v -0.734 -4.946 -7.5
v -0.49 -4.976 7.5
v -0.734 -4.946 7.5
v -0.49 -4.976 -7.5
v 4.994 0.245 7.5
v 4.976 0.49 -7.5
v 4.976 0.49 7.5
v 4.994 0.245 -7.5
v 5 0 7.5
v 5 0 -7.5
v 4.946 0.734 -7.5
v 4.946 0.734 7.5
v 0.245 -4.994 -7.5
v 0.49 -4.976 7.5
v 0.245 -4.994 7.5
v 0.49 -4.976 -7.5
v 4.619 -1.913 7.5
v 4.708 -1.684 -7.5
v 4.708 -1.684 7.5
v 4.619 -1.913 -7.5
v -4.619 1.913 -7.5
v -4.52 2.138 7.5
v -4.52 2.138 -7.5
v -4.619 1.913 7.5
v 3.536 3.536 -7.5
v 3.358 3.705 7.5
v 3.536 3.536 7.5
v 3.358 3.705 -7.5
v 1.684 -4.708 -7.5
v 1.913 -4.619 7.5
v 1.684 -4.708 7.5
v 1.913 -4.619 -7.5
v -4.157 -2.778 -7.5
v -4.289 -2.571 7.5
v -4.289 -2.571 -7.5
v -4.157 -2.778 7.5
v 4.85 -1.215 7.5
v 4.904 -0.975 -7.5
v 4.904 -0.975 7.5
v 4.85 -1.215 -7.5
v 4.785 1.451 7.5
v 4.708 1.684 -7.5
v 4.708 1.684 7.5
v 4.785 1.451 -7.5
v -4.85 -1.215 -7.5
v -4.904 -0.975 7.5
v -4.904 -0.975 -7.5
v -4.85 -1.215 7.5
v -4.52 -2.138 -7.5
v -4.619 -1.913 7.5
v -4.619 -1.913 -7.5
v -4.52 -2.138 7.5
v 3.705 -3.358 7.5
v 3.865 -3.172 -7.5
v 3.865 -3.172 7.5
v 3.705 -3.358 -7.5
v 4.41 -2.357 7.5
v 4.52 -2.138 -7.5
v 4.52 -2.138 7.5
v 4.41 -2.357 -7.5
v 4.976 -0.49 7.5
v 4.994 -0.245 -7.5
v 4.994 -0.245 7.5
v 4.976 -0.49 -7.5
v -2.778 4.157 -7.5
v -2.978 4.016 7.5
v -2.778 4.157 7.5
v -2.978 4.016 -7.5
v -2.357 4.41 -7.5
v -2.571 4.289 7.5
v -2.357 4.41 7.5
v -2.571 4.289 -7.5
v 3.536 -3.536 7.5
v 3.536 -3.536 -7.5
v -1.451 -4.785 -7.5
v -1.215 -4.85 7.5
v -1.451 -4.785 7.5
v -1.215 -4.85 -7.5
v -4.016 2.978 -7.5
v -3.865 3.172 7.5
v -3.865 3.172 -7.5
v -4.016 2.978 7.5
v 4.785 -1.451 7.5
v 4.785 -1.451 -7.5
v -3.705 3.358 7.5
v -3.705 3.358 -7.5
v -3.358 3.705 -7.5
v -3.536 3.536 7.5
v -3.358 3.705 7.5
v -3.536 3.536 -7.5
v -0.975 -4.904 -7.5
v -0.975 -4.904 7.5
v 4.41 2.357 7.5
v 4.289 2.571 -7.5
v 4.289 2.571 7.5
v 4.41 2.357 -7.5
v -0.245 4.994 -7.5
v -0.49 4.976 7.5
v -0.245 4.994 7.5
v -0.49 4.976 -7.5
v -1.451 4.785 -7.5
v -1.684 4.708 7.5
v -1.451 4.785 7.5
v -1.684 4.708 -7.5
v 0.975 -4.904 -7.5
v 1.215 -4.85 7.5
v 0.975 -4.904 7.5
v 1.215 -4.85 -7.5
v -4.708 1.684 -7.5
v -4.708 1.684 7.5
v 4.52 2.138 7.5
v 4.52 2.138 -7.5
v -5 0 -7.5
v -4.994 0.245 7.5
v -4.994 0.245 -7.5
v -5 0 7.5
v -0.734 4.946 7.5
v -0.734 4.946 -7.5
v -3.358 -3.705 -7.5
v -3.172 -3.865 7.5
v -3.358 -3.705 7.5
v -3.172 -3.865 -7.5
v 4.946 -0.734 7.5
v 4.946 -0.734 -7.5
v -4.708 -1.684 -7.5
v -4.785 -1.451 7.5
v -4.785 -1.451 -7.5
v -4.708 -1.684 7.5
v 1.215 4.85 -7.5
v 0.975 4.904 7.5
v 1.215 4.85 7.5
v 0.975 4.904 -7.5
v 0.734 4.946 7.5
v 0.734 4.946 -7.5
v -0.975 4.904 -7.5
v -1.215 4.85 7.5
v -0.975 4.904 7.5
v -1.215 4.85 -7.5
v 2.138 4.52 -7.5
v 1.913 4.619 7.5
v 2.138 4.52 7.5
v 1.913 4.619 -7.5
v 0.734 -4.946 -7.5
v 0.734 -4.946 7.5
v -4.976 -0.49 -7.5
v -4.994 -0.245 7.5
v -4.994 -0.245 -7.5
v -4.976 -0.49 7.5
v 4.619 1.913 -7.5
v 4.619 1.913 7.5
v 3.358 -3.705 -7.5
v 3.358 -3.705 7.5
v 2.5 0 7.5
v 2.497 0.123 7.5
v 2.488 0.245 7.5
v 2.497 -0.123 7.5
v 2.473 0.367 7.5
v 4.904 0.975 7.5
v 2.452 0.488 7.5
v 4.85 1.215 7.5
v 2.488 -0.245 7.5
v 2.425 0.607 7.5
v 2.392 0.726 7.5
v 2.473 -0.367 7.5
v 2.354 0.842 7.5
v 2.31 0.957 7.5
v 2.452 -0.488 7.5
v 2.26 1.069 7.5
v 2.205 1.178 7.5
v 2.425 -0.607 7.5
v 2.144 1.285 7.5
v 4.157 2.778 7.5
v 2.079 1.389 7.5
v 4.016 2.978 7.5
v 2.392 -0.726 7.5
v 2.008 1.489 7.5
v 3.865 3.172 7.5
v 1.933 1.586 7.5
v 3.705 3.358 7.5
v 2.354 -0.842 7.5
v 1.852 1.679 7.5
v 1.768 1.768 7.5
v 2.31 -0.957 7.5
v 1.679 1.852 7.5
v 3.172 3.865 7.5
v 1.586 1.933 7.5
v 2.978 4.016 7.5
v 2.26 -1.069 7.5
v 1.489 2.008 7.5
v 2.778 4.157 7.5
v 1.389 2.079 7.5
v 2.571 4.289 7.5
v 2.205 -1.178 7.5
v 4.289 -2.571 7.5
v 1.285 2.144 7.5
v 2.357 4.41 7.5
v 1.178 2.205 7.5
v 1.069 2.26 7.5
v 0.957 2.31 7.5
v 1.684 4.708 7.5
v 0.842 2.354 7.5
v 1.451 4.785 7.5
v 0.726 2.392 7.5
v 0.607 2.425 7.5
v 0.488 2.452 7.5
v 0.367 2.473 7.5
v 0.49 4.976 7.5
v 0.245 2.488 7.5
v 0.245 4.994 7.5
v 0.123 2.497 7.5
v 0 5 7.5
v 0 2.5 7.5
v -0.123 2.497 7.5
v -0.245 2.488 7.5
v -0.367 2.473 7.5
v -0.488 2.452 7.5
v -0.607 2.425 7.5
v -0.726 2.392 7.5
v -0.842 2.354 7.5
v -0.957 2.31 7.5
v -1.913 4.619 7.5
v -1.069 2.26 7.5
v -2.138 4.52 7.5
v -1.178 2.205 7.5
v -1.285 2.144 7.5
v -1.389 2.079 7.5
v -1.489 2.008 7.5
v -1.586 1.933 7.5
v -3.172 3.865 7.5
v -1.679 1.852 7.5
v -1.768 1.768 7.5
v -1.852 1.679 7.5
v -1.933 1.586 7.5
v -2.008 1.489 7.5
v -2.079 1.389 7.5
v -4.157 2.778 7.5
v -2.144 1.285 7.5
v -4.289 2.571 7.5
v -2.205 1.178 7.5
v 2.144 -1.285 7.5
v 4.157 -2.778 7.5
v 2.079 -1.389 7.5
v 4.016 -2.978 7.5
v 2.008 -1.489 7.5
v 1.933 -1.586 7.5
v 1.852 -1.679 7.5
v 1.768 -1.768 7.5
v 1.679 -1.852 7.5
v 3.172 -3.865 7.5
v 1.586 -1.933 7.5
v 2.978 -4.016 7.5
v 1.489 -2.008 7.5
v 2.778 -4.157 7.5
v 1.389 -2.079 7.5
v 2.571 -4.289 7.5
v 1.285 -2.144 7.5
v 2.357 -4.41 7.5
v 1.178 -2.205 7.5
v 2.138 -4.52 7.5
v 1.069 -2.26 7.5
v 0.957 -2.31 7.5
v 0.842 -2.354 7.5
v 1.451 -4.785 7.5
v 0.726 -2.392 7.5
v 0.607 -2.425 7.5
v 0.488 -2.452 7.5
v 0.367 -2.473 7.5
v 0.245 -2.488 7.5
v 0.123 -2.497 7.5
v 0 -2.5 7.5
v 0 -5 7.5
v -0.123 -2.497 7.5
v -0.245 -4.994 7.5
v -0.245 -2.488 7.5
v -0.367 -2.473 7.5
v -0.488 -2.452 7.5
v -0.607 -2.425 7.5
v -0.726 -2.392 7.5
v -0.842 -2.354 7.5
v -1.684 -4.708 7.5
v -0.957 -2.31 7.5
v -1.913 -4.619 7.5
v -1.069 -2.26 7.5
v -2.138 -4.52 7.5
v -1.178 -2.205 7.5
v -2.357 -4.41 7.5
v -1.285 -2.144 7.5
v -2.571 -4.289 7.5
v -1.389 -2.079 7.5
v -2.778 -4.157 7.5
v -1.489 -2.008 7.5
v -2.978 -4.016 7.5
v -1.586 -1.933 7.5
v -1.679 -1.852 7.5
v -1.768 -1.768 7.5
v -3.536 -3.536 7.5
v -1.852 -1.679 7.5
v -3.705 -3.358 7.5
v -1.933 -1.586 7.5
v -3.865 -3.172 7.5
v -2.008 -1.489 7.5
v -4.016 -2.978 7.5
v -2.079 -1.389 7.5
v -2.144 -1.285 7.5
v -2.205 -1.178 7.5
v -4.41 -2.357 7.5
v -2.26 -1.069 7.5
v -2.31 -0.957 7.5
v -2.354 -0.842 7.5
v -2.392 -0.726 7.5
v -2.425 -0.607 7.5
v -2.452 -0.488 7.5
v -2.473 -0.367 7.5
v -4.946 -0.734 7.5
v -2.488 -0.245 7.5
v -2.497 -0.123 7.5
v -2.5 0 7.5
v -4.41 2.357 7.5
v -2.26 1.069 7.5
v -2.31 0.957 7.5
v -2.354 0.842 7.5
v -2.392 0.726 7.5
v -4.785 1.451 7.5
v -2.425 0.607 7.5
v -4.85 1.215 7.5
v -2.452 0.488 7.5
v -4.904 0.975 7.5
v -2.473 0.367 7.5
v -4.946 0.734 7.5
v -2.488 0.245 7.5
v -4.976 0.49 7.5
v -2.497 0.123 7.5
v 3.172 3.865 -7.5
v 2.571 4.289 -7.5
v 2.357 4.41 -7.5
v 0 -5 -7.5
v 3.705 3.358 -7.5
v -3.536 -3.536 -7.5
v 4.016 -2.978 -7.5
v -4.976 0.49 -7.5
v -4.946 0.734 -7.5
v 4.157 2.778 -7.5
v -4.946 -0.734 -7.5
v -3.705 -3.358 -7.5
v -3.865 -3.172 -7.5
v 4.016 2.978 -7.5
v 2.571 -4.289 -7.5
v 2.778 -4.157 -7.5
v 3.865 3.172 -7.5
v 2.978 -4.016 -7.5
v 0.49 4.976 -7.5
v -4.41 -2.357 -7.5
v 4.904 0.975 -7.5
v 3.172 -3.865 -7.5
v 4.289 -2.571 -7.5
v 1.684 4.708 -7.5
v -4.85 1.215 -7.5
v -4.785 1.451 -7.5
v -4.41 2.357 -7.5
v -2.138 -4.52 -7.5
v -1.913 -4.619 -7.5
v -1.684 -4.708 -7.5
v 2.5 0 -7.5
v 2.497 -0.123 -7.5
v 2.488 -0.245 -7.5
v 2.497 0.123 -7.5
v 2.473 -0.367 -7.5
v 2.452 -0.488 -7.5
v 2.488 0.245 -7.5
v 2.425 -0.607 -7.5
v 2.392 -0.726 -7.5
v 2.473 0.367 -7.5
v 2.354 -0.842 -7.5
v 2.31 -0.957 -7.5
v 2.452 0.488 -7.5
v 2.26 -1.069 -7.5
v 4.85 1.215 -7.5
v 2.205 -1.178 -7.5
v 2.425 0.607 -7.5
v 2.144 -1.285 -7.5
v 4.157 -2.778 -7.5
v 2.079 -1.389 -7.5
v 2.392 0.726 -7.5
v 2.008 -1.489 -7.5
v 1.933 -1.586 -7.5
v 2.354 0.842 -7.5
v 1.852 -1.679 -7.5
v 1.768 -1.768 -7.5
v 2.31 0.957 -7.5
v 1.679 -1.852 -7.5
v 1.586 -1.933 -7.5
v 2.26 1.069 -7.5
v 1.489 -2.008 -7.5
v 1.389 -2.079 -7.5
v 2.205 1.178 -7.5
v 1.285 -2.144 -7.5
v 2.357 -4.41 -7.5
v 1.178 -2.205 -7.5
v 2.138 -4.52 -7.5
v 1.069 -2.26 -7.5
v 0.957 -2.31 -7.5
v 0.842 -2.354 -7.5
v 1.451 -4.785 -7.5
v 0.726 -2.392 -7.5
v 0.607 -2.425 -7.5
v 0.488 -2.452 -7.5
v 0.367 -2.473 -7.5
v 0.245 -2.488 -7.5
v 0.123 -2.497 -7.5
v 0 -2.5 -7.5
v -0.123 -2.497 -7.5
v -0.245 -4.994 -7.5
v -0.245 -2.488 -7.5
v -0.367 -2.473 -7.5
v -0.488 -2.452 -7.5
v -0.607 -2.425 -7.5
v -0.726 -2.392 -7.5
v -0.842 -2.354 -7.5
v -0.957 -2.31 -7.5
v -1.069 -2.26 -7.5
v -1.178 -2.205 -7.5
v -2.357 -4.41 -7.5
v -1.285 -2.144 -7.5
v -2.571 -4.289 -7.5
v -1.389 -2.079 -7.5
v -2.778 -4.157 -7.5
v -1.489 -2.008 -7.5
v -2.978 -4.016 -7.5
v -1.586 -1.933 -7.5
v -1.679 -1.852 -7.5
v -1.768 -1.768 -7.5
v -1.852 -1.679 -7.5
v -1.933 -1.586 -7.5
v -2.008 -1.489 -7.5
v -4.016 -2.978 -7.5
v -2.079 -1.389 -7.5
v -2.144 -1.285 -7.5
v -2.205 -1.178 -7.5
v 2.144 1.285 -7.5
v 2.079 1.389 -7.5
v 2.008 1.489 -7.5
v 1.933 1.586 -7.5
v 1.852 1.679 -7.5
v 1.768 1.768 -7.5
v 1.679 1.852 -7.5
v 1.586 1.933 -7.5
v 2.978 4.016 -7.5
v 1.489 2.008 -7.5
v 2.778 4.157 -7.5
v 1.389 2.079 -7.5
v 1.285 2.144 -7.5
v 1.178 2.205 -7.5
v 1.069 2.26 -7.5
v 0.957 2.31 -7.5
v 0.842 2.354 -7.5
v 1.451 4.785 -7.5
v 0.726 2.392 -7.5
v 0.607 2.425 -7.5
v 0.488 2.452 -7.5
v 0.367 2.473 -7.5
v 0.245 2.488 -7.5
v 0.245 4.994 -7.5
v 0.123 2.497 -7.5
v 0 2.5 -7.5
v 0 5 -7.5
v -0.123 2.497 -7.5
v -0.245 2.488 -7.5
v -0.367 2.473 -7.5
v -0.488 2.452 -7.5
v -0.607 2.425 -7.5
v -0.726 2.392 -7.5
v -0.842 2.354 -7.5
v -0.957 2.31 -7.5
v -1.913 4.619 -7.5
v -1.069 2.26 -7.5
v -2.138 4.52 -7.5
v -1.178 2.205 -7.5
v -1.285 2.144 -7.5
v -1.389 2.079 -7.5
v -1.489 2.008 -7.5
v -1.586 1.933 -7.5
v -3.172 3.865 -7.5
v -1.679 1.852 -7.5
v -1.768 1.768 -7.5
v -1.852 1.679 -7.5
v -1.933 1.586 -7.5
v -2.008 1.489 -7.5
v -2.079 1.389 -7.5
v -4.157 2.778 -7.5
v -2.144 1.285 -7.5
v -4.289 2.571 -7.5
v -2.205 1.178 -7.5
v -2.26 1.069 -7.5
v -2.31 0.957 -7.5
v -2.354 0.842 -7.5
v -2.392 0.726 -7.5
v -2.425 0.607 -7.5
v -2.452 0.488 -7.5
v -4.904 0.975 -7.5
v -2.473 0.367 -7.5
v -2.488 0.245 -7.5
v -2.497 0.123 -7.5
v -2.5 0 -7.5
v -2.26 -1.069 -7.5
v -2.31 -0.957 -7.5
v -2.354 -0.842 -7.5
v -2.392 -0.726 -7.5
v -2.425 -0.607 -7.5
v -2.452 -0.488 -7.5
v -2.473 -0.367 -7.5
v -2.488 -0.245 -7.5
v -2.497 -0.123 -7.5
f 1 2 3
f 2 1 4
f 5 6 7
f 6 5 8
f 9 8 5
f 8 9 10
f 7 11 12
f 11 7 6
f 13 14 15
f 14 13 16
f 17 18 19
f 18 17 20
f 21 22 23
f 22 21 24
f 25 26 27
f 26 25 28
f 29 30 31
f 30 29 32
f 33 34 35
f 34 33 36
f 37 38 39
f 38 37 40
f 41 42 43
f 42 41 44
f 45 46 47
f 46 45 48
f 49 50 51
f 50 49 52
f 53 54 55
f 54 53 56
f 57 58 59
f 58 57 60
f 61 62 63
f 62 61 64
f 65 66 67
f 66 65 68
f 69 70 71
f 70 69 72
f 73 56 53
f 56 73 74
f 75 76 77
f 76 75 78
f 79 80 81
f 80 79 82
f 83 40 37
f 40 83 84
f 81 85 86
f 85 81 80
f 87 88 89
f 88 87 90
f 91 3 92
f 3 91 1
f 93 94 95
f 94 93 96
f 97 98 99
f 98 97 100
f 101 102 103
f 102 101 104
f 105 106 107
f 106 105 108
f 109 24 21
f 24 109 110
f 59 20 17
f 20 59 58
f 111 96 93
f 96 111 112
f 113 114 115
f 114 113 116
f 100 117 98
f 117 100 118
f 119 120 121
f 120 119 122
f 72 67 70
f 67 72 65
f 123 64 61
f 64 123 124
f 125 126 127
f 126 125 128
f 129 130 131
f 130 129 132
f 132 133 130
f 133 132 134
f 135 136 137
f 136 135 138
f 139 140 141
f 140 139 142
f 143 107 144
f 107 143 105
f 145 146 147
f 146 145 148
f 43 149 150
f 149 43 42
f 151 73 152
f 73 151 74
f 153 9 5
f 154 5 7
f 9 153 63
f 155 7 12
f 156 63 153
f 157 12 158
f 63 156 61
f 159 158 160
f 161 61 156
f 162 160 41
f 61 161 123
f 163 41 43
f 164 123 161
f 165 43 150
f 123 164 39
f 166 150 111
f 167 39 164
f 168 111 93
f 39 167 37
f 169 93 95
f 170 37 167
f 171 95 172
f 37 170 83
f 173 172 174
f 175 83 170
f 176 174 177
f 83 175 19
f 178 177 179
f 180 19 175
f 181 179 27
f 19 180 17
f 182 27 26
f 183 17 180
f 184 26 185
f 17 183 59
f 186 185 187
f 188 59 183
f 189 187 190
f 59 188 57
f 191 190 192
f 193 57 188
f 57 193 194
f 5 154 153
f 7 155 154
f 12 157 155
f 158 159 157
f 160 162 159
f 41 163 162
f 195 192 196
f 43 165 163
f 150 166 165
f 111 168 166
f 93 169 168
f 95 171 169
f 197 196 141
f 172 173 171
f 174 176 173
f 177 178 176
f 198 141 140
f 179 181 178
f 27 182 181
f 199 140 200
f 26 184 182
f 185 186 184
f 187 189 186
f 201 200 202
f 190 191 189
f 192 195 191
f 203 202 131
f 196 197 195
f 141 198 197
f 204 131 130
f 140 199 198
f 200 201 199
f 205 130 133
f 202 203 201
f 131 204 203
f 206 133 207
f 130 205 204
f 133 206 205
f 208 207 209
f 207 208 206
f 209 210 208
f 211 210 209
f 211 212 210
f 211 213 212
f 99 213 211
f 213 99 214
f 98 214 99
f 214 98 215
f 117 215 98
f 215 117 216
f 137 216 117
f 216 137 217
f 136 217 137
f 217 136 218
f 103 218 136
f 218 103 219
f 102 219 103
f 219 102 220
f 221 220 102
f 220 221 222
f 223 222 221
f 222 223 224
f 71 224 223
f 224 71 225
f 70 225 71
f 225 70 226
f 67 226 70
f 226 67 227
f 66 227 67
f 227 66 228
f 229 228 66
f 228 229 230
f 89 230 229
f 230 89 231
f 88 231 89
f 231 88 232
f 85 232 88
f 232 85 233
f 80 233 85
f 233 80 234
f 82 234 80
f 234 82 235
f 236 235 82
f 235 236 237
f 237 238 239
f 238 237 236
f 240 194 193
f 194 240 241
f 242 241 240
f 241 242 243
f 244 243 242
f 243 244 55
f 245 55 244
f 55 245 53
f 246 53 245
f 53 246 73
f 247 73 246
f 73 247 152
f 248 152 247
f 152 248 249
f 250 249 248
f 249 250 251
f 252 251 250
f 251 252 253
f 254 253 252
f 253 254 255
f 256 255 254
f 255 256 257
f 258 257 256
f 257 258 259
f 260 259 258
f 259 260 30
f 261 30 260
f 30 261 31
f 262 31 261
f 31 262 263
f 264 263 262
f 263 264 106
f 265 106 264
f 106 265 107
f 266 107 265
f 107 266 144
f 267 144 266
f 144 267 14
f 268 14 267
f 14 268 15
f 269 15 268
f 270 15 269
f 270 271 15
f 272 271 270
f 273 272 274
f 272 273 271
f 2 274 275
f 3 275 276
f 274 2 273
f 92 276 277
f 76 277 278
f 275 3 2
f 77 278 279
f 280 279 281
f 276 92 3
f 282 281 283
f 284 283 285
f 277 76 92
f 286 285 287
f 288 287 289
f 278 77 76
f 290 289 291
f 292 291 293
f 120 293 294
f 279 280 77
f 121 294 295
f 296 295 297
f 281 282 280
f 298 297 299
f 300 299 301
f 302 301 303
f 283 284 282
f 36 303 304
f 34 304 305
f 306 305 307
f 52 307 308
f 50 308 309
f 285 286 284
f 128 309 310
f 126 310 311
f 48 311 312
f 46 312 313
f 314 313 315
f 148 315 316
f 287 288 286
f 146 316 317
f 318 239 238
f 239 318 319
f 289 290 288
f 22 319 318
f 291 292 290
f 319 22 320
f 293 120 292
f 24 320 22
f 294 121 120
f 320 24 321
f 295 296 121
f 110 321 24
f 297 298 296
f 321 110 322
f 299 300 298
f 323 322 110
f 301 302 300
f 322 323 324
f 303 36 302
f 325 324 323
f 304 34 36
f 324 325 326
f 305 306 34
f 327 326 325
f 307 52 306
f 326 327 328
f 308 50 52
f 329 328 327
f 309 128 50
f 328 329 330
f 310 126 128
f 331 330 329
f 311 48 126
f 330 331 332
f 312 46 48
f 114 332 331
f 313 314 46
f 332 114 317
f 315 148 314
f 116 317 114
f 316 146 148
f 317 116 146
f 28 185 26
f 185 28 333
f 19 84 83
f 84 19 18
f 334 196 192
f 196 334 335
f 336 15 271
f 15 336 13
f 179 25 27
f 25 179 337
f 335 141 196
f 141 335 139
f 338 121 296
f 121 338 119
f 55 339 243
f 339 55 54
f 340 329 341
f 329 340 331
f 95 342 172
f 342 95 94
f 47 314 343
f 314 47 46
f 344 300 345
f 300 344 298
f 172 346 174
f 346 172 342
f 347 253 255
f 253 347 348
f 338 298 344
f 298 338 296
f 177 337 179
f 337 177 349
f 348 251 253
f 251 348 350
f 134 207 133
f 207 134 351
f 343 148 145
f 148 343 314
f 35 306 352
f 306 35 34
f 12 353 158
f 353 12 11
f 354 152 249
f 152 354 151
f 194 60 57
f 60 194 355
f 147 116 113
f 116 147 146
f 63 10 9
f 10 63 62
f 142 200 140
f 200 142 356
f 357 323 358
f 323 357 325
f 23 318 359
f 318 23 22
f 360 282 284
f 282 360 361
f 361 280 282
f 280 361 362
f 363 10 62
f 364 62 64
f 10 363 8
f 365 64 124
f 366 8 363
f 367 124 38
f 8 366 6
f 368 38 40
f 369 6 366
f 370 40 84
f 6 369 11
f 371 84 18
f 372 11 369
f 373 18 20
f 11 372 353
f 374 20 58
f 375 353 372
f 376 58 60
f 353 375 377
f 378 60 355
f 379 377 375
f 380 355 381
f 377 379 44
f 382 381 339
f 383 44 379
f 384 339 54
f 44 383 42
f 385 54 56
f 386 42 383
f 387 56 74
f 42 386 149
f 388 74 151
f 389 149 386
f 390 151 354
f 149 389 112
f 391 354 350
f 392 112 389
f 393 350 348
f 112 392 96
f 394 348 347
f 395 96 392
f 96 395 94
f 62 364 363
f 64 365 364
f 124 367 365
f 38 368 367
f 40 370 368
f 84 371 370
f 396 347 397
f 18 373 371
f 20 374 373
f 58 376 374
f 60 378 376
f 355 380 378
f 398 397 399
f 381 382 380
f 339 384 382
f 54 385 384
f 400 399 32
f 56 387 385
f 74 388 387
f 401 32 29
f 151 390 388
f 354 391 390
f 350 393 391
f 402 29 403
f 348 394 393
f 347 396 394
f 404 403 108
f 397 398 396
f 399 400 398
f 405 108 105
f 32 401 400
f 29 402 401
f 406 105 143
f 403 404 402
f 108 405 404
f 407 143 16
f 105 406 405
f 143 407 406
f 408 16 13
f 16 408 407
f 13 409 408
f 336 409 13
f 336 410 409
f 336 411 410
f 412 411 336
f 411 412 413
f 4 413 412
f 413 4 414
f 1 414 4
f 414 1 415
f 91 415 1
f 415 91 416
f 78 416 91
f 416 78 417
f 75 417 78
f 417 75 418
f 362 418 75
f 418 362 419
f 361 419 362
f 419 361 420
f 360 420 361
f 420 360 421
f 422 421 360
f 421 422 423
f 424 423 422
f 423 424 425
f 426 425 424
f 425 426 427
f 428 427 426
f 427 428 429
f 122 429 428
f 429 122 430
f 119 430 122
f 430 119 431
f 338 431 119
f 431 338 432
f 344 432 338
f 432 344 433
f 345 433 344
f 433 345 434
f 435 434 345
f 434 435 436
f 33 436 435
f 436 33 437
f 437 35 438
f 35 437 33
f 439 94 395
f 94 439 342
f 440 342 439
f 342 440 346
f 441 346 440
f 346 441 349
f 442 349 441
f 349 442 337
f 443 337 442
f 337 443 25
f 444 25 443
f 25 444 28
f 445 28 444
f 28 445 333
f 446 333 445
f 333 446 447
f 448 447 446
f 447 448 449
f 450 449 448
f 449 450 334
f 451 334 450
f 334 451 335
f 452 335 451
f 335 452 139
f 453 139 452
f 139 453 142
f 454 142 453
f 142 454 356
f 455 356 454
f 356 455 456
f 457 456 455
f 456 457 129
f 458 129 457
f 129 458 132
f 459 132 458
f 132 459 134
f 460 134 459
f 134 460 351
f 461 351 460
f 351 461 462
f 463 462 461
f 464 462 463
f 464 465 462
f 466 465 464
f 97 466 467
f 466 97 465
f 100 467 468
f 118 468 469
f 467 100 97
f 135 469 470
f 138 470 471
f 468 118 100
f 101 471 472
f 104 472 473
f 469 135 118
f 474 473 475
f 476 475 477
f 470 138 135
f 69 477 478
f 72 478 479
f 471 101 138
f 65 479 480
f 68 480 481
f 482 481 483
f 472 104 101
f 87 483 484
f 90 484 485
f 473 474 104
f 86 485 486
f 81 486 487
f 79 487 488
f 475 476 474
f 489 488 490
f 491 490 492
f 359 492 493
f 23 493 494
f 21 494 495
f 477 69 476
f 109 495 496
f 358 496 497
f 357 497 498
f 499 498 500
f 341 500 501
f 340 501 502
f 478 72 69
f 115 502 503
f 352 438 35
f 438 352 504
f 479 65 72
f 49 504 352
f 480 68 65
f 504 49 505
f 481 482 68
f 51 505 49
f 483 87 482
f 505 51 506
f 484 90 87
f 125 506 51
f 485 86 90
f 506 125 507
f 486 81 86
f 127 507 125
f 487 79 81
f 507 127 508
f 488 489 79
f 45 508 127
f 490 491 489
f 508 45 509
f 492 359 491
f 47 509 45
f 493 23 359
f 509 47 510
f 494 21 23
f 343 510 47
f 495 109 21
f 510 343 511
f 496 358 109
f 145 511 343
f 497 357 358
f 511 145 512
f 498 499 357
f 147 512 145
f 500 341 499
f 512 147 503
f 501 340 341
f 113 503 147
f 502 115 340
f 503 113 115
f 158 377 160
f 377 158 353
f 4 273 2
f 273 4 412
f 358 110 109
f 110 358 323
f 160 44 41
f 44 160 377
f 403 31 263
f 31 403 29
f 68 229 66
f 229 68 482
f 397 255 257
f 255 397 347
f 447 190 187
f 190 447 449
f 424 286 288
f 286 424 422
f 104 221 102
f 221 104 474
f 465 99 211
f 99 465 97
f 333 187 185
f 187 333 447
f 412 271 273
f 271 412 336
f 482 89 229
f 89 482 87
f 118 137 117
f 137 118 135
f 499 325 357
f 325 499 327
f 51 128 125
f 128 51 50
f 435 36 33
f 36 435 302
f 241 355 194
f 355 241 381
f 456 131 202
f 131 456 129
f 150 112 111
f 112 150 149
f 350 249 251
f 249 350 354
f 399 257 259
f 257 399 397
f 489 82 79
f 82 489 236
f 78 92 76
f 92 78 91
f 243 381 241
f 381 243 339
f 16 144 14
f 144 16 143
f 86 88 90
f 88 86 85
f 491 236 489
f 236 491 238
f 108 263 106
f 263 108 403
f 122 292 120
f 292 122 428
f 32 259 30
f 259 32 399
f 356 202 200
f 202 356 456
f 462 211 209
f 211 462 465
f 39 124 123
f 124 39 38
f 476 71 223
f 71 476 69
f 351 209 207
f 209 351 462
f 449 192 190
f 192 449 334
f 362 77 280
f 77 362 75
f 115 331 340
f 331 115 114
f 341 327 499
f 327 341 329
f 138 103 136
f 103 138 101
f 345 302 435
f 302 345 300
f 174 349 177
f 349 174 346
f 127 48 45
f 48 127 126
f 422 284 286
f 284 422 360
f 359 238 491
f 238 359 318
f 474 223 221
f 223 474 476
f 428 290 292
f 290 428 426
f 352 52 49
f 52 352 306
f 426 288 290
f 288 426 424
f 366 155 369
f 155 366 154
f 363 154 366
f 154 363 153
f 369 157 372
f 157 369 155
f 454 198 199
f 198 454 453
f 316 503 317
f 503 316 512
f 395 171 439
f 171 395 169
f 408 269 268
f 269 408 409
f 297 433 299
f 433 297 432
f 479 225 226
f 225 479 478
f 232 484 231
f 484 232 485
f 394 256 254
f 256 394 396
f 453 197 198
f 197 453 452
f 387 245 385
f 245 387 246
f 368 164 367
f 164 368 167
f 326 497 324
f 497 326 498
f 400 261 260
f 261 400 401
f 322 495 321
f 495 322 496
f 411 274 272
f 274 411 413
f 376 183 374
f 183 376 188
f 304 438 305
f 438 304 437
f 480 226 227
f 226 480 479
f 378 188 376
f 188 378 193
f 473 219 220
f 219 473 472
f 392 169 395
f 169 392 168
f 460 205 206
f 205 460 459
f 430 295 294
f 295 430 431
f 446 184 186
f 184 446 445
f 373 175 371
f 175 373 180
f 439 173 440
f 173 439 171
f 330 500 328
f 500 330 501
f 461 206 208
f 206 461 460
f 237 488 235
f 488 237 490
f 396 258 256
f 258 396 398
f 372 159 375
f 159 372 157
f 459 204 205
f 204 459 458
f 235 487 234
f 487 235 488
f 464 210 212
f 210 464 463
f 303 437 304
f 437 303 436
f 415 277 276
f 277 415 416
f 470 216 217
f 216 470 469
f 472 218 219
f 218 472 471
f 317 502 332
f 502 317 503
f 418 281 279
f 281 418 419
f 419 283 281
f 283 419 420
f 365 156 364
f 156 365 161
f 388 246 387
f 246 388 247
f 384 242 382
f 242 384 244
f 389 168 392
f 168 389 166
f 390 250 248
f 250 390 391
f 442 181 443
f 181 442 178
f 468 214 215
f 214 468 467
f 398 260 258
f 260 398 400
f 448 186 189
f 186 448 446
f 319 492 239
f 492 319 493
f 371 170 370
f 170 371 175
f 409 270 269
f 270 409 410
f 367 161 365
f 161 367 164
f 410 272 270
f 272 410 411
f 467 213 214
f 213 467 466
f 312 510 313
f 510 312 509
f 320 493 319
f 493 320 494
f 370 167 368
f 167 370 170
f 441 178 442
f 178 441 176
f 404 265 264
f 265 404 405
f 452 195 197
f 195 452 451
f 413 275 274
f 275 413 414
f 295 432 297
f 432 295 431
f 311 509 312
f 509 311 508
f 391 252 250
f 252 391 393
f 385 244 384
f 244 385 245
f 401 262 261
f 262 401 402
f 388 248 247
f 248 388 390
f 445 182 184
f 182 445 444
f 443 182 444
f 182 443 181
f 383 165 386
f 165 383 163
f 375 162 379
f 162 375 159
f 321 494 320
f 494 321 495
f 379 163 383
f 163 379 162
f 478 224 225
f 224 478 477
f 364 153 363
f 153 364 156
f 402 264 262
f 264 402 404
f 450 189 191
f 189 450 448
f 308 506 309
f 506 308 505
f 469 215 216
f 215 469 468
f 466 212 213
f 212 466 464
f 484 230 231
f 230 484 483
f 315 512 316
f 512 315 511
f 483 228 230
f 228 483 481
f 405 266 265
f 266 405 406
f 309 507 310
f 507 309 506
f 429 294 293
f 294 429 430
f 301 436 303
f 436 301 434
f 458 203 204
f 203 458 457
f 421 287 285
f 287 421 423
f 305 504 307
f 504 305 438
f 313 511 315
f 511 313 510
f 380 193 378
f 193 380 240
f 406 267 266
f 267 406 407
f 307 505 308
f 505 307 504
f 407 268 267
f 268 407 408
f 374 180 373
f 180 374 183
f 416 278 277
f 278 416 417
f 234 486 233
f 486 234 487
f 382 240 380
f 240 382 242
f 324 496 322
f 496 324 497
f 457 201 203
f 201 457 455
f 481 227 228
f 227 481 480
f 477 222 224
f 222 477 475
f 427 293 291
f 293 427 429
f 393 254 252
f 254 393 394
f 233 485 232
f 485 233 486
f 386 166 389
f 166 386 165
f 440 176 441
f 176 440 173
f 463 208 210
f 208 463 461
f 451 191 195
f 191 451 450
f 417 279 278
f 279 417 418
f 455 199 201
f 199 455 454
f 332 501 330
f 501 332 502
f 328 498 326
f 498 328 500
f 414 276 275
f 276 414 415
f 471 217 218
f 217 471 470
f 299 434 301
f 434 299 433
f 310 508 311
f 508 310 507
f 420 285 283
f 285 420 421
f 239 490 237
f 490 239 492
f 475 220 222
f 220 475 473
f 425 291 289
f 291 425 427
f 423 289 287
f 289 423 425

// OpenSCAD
// Linear bearing: 5.0mm bore, 10.0mm OD, 15.0mm length

bore_diameter  = 5.0;
outer_diameter = 10.0;
length         = 15.0;

// Smoothness (avoid polygonal/hex look)
$fn = 128;

module linear_bearing(bore_d=bore_diameter, od=outer_diameter, L=length) {
    difference() {
        // Outer body
        cylinder(d=od, h=L, center=true);

        // Through bore (slightly longer to guarantee clean cut)
        cylinder(d=bore_d, h=L + 0.2, center=true);
    }
}

linear_bearing();
